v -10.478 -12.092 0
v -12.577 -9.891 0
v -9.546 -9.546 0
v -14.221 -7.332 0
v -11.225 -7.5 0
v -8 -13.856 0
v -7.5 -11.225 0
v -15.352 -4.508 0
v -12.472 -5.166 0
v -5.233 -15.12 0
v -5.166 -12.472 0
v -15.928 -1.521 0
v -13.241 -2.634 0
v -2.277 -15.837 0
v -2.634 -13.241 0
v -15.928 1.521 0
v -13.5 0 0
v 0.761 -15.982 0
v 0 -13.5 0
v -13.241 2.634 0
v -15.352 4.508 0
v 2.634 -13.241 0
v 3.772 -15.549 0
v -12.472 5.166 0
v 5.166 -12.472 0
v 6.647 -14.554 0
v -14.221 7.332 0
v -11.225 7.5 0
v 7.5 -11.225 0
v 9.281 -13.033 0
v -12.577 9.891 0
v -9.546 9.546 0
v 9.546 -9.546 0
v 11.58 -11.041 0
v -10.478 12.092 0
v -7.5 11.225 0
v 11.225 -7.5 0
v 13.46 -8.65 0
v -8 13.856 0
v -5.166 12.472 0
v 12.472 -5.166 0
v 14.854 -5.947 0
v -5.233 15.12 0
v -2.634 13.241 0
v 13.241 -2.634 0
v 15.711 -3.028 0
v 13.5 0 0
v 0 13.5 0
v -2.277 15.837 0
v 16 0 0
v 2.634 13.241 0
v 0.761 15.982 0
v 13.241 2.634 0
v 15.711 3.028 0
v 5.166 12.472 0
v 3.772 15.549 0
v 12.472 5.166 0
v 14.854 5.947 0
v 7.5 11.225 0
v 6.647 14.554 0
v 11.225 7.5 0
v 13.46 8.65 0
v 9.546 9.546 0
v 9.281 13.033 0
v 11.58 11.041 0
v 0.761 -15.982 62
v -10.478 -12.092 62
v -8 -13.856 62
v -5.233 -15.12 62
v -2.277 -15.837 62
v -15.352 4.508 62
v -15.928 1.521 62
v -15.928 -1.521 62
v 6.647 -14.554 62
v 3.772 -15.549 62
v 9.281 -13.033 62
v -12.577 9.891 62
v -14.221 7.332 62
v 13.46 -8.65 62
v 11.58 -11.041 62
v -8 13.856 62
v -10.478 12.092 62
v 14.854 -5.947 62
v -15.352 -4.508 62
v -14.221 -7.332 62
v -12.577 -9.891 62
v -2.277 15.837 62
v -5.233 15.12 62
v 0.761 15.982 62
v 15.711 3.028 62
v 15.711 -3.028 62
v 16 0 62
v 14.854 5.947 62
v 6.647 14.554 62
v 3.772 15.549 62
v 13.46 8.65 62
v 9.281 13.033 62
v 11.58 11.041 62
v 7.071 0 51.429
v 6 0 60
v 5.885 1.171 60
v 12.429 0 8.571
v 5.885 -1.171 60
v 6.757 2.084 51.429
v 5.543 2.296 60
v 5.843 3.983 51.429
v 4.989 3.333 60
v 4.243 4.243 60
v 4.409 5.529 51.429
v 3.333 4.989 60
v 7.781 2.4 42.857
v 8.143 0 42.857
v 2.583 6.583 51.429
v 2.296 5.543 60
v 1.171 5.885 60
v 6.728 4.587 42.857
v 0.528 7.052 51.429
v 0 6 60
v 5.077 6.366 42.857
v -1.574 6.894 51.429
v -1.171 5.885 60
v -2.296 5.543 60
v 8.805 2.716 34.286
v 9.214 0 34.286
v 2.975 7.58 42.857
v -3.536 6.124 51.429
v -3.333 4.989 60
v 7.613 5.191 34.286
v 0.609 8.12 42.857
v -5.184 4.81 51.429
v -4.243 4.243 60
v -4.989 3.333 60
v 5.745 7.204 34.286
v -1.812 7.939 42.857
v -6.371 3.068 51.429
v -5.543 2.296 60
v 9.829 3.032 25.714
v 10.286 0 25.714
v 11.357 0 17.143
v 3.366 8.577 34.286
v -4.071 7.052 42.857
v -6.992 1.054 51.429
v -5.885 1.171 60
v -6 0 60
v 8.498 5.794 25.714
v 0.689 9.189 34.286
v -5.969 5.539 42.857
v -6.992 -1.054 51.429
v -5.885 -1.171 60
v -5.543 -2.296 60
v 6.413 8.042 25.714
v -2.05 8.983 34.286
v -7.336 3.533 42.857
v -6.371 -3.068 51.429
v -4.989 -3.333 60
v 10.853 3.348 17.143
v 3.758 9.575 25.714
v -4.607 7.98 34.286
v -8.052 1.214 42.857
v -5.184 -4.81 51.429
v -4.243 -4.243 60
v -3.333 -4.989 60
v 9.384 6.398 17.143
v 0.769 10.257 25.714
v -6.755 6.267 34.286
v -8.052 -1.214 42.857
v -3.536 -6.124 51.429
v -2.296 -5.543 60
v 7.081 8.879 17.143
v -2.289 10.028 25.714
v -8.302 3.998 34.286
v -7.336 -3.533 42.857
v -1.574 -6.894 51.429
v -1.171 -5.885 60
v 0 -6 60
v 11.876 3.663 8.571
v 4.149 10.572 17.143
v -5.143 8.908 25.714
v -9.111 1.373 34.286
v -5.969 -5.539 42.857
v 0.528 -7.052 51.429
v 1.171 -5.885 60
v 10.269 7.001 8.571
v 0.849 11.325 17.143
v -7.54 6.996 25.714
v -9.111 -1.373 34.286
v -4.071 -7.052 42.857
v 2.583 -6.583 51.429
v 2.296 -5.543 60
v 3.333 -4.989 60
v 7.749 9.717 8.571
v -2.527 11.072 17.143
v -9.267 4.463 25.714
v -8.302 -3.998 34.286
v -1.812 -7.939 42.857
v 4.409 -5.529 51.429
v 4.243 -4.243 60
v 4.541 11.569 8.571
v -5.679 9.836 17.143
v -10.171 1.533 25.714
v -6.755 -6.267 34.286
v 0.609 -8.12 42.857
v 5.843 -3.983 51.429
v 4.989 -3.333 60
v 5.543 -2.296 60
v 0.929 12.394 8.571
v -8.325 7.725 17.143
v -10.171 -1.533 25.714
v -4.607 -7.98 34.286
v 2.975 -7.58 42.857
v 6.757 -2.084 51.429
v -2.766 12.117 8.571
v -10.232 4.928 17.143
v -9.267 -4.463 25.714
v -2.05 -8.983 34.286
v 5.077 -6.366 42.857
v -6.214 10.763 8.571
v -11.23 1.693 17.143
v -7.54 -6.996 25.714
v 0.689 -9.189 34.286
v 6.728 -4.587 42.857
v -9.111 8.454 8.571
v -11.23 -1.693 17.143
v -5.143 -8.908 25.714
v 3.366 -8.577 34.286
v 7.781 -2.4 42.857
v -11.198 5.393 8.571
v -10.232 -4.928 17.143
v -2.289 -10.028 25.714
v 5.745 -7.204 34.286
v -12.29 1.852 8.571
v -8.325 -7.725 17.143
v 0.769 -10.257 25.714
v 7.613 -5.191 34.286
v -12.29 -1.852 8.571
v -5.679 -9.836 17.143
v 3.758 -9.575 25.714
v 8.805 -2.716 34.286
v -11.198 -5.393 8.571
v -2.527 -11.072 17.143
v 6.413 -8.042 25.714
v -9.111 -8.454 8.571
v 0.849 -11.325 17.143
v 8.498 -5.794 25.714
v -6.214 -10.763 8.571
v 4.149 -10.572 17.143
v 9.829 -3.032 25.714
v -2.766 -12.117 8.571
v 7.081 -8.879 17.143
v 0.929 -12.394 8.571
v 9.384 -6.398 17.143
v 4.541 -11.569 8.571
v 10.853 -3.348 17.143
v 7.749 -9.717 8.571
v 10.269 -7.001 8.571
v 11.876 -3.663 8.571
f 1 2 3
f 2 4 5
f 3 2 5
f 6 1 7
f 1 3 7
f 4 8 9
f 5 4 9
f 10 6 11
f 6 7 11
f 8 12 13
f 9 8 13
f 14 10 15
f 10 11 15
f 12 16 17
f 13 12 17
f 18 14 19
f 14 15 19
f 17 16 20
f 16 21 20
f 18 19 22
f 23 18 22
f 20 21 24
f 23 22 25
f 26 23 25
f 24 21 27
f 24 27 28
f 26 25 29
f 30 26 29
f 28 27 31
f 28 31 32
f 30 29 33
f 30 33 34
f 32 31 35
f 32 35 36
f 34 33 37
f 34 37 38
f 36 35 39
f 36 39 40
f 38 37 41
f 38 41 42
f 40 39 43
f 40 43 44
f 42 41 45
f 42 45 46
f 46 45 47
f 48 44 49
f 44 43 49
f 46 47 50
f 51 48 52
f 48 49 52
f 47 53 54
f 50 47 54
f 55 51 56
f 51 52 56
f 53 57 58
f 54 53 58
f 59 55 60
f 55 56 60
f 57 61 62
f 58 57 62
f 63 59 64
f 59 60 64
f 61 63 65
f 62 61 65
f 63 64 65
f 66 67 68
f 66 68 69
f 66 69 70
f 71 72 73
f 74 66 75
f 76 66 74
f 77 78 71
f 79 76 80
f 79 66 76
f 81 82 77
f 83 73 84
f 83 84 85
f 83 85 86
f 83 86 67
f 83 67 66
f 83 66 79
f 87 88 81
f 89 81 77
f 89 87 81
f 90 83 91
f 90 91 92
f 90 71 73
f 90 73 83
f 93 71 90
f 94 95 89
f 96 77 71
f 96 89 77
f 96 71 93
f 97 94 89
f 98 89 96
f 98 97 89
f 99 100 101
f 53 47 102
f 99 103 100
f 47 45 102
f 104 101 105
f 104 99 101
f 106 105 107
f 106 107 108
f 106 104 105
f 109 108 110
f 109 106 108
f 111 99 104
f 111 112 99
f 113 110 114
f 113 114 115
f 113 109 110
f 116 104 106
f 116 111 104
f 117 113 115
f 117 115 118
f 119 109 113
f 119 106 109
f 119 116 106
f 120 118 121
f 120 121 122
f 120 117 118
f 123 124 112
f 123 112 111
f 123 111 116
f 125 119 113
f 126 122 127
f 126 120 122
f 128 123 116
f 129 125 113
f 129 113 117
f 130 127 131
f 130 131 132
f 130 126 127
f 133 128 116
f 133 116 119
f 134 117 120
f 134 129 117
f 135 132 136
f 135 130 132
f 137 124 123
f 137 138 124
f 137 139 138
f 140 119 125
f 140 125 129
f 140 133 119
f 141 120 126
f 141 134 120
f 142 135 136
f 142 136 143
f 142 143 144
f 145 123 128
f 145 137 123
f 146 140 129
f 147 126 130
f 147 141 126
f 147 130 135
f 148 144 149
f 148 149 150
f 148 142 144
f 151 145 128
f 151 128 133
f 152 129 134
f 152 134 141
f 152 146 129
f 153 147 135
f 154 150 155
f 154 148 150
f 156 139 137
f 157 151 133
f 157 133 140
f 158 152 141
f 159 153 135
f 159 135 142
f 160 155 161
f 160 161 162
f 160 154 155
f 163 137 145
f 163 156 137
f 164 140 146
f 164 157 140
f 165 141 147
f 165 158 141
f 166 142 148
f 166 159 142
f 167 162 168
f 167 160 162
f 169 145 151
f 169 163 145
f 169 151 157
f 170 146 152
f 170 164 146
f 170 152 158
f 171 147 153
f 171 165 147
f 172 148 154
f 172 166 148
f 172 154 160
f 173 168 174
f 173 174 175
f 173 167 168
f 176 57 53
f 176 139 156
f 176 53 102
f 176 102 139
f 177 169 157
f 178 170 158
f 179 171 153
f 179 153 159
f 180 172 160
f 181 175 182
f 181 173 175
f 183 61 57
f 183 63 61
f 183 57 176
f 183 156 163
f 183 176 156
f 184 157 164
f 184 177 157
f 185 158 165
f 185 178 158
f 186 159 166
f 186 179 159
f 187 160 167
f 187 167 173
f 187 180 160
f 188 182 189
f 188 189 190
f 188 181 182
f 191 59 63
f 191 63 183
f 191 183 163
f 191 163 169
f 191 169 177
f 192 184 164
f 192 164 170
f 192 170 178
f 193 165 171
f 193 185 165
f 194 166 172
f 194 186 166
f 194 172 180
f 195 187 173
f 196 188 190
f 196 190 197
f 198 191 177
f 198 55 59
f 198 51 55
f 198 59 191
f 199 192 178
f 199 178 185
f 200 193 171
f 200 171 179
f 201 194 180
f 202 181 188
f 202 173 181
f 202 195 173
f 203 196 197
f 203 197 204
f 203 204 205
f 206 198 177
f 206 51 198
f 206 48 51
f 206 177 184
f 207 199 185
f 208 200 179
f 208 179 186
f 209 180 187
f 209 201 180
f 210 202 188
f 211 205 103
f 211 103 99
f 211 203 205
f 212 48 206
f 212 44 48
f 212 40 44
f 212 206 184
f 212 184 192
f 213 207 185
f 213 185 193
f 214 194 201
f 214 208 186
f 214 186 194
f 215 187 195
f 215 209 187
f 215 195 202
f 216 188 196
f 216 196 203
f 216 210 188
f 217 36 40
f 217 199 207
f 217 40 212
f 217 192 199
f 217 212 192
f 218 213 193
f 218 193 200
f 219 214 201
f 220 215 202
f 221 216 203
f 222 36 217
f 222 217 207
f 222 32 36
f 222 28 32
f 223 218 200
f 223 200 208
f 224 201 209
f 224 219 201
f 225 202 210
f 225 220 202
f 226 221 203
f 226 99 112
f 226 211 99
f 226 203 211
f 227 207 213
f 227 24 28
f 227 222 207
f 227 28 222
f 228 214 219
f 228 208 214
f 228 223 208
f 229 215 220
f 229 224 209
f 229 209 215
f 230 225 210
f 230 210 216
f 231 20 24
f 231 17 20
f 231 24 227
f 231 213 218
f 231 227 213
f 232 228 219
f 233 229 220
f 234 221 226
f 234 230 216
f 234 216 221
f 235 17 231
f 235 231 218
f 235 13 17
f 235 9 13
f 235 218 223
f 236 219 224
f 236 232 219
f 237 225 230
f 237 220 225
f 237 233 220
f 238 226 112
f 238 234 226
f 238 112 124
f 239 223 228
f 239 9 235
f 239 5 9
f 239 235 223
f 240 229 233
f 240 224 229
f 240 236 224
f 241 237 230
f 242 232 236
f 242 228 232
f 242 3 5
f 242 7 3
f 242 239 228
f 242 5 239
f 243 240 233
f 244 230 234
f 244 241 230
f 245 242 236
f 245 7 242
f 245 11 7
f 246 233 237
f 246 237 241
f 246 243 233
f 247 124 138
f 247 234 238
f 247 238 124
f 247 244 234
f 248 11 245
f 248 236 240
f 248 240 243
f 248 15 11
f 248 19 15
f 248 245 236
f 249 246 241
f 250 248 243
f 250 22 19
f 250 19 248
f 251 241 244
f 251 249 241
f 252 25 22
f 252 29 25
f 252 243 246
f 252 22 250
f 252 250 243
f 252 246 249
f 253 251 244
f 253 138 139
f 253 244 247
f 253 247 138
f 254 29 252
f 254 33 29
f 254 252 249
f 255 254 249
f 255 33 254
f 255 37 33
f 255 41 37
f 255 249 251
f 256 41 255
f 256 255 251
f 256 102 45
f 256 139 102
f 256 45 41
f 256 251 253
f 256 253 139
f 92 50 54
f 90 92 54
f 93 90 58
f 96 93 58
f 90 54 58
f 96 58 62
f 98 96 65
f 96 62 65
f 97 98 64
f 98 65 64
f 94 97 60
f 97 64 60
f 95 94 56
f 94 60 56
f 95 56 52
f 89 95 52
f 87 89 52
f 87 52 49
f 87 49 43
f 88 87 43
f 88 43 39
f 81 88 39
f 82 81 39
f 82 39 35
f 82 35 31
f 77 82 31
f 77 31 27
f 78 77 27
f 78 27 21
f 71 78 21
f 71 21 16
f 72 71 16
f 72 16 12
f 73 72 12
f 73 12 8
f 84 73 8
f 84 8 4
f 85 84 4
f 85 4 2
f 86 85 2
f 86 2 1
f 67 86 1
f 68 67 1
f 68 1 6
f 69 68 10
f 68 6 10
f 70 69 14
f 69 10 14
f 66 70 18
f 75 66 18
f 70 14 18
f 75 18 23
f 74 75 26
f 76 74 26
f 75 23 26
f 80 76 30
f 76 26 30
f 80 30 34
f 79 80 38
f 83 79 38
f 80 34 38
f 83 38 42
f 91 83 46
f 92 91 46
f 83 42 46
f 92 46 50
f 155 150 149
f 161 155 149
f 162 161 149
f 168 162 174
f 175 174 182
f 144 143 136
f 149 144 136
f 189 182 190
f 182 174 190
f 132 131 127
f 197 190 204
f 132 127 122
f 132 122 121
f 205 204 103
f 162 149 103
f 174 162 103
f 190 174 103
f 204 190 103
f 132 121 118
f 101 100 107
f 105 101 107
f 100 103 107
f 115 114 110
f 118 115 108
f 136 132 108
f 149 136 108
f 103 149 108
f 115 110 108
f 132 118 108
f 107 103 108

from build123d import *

# Parameters (mm, degrees)
F3_R        = 16
F4_DEPTH    = 60
F2_R        = 6
F0_R        = 13.5
F4_FACE_R   = 16
F4_FACE_R_2 = 6
F6_DEPTH    = 2


with BuildPart() as f4:
    # F3 (on Top) → F4 (new body)
    with BuildSketch(Plane.XY):
        Circle(F3_R)
    extrude(amount=F4_DEPTH)

    # F2 (on offset) → F5 section 0
    with BuildSketch(Plane.XY.offset(60)):
        Circle(F2_R)
    # F0 (on Top) → F5 section 1
    with BuildSketch(Plane.XY):
        Circle(F0_R)
    loft(mode=Mode.SUBTRACT)

    # F2 (on offset) + F4_face (on face) → F6 (join)
    with BuildSketch(Plane.XY.offset(60)):
        Circle(F2_R)
    with BuildSketch(Plane.XY.offset(60)):
        Circle(F4_FACE_R)
        Circle(F4_FACE_R_2, mode=Mode.SUBTRACT)
    extrude(amount=F6_DEPTH)


solid = f4.part
